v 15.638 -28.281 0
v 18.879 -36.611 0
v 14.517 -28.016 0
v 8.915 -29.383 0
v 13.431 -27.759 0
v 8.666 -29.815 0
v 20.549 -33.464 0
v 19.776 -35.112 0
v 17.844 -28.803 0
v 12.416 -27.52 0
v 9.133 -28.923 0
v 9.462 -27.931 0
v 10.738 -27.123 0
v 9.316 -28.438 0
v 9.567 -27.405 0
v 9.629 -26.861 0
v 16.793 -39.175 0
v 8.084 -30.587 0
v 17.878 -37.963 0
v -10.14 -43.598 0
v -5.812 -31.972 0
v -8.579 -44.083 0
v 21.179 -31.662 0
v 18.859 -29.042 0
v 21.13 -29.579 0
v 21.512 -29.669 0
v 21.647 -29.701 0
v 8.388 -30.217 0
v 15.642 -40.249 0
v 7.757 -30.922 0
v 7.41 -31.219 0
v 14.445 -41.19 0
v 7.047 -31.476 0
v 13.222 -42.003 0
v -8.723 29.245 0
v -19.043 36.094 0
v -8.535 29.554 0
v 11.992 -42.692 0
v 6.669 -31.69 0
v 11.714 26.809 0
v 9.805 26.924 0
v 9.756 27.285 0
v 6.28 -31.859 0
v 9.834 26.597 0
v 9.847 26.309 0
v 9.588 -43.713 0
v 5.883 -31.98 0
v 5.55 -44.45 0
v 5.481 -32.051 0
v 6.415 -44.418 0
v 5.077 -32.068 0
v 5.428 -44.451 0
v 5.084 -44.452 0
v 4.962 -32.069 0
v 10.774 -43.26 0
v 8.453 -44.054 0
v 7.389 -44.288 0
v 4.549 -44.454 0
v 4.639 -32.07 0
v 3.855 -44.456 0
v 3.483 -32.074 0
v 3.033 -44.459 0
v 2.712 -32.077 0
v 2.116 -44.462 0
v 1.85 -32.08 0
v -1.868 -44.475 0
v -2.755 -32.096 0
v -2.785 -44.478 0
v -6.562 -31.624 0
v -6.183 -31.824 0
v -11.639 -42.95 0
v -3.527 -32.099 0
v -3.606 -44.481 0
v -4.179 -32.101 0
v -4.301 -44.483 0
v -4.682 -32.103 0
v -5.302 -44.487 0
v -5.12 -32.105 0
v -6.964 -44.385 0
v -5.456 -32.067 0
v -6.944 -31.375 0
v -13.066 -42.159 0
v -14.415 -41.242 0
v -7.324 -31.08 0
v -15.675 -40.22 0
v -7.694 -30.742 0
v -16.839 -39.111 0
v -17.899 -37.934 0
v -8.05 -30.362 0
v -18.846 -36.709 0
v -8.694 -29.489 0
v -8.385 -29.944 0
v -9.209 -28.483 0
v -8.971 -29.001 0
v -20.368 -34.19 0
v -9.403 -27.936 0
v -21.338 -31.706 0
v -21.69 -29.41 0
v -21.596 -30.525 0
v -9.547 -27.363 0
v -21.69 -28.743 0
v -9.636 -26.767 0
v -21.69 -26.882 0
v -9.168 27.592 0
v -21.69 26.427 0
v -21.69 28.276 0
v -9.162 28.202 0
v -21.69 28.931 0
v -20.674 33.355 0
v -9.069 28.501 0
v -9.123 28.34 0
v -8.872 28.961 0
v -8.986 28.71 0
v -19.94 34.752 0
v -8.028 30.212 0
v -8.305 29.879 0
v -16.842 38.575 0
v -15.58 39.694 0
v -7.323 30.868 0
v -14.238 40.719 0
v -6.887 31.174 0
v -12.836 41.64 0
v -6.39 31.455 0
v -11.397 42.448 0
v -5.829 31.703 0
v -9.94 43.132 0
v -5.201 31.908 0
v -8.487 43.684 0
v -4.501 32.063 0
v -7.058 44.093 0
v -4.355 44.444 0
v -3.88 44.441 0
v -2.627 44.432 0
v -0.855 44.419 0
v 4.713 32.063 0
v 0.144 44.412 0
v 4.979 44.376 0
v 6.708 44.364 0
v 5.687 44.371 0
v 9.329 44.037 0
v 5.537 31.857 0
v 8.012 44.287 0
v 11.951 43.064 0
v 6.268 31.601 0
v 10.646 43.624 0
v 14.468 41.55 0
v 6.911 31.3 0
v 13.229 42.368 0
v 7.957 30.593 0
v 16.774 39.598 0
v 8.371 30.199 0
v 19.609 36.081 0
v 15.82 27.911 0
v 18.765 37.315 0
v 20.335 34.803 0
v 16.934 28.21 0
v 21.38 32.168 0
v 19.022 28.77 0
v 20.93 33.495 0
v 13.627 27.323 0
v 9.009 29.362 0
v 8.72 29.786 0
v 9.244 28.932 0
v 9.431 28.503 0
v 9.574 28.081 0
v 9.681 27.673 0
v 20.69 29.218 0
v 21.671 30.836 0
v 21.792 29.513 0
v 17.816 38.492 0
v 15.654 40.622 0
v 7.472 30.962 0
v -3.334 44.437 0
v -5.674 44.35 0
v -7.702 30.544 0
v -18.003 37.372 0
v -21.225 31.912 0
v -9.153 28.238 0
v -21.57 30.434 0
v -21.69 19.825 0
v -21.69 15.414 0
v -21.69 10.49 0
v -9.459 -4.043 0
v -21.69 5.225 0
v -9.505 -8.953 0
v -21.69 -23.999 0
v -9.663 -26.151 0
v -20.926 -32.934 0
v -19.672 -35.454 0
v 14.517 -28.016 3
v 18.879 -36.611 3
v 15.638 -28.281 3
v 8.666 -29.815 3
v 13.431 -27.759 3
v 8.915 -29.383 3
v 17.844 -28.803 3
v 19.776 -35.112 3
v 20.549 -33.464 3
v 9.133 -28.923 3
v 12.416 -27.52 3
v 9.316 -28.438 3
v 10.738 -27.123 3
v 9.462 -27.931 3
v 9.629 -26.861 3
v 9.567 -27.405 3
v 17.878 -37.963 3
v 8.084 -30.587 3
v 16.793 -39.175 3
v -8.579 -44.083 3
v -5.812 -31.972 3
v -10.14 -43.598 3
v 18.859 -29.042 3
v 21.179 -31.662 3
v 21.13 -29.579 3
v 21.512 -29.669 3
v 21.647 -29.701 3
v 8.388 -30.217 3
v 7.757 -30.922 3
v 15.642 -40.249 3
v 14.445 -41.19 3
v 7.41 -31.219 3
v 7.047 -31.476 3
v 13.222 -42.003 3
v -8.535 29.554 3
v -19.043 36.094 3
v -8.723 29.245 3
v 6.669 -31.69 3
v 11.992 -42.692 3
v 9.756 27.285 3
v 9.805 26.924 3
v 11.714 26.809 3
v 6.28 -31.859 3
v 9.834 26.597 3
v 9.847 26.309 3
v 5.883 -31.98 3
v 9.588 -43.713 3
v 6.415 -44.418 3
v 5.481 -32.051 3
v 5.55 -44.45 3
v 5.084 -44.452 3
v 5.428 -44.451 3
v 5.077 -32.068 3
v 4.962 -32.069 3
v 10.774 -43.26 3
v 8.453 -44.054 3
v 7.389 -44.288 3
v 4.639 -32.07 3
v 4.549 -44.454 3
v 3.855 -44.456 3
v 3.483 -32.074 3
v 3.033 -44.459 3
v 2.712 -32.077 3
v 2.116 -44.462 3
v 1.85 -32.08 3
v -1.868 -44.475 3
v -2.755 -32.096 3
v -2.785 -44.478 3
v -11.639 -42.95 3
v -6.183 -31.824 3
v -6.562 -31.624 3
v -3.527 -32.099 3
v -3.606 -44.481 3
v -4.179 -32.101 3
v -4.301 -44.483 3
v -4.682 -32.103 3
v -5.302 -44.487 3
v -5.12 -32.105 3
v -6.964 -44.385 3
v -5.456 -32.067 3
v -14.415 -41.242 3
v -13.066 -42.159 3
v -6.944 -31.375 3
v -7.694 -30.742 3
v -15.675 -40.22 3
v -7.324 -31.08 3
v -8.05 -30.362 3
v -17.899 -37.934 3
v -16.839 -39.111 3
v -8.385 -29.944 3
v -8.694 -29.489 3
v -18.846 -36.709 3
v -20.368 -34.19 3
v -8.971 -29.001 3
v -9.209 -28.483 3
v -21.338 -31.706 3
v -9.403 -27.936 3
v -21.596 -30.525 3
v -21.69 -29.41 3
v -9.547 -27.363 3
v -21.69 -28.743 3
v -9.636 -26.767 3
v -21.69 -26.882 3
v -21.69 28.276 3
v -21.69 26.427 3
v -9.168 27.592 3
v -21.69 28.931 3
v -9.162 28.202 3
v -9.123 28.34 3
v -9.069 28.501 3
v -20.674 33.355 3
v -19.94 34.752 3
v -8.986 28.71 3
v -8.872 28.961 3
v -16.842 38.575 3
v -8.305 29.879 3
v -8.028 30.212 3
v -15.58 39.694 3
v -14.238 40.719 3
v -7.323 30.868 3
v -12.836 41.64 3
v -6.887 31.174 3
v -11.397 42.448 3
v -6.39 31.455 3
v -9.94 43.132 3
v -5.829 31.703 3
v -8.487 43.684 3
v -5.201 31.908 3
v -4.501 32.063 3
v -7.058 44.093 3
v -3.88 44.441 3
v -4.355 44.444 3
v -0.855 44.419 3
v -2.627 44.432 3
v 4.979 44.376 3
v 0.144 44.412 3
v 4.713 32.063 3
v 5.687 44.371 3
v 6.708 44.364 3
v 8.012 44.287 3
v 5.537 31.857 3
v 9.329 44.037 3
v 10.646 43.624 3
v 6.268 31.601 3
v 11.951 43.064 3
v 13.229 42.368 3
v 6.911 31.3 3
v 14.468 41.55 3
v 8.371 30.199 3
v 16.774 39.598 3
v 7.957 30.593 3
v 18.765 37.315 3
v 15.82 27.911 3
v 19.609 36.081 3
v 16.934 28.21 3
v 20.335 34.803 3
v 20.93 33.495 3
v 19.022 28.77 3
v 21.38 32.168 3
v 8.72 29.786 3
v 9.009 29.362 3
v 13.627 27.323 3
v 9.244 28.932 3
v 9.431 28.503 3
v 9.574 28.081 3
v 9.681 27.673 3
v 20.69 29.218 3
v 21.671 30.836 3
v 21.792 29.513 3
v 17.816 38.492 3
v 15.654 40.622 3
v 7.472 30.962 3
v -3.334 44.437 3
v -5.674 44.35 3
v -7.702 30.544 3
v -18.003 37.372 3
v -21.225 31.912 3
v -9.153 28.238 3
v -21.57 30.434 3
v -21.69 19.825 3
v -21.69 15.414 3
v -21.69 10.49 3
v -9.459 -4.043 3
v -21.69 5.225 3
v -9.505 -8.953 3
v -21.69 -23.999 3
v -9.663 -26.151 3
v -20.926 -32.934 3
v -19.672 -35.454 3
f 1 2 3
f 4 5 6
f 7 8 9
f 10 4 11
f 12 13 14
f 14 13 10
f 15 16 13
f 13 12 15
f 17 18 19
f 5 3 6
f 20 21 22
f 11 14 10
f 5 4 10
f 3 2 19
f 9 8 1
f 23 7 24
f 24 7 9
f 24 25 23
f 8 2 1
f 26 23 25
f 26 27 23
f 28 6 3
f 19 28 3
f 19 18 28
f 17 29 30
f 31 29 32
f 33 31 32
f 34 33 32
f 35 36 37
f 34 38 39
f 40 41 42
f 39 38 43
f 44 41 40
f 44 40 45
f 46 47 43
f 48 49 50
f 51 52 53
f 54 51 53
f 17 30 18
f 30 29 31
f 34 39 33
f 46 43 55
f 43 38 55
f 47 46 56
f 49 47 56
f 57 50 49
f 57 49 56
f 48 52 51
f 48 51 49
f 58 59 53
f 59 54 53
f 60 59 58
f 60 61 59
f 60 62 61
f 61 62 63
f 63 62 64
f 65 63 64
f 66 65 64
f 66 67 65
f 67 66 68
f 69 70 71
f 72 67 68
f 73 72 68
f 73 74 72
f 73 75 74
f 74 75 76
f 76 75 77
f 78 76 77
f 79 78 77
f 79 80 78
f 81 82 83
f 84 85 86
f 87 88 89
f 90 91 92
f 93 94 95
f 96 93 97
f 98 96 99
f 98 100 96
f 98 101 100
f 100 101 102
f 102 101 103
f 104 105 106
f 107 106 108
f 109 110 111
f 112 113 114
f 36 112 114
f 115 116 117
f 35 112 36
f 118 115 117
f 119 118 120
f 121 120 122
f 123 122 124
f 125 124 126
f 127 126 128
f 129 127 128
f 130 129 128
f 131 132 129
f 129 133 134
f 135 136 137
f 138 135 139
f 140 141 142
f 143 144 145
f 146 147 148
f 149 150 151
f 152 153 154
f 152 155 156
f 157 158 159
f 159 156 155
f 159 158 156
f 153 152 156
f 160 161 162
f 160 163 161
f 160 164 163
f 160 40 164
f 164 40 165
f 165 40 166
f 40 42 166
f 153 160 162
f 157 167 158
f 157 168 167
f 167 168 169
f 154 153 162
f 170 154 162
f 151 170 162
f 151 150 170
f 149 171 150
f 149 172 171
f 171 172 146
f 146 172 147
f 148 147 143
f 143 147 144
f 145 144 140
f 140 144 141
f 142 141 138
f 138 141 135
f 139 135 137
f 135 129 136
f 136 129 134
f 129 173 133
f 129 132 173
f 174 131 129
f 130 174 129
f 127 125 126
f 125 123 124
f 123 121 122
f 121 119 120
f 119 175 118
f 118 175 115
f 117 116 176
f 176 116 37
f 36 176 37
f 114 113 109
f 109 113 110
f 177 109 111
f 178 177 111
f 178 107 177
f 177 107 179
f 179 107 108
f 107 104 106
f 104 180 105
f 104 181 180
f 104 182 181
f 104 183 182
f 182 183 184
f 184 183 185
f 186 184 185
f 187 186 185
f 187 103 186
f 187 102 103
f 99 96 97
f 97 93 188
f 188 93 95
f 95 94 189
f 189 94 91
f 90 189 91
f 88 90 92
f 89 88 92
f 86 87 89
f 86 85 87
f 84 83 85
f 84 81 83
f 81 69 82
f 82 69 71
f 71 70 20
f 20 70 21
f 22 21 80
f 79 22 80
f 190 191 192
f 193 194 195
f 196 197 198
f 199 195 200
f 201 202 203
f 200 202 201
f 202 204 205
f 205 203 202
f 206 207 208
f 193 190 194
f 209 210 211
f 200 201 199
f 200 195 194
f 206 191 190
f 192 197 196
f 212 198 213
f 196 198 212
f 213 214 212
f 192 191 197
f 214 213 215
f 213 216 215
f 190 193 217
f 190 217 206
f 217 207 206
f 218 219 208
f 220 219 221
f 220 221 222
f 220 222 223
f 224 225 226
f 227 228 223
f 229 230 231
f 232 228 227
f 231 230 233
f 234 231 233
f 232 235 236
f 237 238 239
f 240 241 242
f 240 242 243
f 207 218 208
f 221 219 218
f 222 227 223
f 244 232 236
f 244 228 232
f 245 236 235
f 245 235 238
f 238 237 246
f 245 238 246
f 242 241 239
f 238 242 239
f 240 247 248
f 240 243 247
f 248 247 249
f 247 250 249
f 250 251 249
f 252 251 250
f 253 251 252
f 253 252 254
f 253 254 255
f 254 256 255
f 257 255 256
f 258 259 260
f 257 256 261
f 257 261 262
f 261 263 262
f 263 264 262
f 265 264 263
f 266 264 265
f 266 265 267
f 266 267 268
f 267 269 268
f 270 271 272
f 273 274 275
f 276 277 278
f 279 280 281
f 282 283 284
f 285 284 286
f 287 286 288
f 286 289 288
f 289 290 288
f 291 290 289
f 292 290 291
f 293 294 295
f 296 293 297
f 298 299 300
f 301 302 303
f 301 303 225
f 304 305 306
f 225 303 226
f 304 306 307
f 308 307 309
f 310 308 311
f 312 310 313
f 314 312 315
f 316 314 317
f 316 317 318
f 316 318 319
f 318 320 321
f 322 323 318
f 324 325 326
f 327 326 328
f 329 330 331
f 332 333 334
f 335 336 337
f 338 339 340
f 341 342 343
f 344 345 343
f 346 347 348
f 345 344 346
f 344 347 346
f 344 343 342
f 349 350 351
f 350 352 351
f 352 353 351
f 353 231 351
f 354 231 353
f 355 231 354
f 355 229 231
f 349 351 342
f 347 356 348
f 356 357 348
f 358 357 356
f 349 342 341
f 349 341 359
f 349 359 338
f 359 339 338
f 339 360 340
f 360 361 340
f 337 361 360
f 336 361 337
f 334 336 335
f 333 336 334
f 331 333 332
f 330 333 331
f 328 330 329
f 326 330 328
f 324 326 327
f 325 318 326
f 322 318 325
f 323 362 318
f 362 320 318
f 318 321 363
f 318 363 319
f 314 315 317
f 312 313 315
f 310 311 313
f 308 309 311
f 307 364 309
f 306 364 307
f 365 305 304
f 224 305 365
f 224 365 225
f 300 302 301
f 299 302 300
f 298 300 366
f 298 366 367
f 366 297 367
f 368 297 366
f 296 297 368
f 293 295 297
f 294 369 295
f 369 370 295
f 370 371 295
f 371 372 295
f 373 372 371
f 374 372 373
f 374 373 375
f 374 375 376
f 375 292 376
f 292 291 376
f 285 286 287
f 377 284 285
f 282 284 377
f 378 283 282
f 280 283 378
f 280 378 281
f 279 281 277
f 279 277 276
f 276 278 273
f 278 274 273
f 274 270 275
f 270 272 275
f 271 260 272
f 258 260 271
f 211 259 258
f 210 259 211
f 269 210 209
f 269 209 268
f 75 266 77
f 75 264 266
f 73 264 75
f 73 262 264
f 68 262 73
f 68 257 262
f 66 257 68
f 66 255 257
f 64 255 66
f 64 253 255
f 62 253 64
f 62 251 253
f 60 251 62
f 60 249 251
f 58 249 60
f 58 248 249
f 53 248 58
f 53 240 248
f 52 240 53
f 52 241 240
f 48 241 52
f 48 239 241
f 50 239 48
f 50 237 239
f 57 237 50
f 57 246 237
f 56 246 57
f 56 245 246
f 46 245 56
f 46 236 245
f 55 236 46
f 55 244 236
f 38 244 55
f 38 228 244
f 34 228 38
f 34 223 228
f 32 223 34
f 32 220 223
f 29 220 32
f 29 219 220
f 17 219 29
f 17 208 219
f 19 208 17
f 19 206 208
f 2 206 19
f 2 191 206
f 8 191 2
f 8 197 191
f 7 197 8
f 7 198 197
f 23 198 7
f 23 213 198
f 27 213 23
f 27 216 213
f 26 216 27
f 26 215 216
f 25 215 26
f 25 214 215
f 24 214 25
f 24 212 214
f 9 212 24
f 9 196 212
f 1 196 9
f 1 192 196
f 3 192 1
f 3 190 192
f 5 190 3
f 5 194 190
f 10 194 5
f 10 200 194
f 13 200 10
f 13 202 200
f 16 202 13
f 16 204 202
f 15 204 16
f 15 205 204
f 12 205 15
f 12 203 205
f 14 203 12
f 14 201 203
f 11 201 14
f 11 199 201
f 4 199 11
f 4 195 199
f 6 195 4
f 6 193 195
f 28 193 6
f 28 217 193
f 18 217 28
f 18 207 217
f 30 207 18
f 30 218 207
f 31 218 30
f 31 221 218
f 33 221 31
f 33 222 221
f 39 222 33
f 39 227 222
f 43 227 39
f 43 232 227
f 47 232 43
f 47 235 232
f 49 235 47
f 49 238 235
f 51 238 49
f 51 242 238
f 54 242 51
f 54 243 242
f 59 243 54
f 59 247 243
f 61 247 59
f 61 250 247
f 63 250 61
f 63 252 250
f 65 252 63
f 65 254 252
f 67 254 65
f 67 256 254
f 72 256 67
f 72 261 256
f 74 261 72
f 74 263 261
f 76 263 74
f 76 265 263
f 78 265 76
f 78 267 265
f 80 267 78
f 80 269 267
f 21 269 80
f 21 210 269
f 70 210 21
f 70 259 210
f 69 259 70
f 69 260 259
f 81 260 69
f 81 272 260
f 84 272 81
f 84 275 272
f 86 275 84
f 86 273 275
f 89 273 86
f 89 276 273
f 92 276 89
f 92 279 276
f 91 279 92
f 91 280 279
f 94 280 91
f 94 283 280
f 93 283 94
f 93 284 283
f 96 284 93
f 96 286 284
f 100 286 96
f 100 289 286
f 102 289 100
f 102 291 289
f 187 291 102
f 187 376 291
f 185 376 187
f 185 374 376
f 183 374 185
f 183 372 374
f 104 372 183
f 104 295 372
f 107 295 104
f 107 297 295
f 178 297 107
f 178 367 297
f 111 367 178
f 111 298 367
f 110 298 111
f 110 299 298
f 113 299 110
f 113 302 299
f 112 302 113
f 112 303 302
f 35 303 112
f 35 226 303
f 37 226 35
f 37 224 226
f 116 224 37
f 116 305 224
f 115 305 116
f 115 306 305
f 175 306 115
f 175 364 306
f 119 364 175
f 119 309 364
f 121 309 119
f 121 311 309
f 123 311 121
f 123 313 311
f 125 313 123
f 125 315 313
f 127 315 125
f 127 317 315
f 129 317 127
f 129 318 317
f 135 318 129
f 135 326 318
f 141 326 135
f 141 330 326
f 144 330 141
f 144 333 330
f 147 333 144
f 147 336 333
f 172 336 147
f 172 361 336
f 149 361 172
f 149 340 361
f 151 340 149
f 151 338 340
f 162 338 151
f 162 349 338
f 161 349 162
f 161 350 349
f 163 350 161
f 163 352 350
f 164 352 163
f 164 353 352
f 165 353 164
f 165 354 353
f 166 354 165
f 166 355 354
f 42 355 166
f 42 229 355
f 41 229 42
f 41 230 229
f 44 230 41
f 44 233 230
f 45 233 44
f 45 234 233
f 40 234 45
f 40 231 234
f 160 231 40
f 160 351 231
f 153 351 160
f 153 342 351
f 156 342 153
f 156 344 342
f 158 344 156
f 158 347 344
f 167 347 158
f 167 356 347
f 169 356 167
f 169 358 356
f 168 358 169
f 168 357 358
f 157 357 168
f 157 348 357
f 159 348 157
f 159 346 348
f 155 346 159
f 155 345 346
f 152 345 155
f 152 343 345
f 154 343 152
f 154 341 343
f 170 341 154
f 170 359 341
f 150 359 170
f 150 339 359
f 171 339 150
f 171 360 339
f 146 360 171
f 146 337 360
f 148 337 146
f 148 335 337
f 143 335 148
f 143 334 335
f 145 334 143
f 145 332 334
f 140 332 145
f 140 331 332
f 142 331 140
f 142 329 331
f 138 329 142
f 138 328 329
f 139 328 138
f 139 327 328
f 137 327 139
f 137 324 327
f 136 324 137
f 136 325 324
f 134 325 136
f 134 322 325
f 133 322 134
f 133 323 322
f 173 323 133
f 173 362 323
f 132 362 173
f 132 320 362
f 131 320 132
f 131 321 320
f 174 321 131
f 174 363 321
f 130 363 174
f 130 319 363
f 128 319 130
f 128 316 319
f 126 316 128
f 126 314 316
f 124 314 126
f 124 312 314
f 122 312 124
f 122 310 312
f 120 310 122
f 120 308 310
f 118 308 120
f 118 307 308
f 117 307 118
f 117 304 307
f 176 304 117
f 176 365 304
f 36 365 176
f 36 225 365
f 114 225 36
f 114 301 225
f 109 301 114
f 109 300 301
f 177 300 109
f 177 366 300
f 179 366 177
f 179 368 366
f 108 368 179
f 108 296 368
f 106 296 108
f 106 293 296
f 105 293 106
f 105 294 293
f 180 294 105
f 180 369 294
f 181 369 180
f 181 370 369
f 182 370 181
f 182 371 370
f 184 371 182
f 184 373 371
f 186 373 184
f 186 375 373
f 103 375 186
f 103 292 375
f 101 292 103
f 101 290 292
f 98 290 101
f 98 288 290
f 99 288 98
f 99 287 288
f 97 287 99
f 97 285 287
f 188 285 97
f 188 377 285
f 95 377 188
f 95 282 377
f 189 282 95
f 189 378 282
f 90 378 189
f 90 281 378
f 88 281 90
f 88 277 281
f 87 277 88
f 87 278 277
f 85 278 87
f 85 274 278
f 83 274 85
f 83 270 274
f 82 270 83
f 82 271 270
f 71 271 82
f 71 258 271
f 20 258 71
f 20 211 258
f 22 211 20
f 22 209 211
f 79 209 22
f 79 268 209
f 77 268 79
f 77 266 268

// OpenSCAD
// Generated from 交通部公路局（原交通部公路總局）「新式號牌使用之英文字、數字字體」author trace
fudge = 0.1;

module glyph_2012_C(h = 3) {
  difference() {
    linear_extrude(height = h)
      polygon(points = [[21.7924, 29.5133], [21.6715, 30.8365], [21.3796, 32.168], [20.9298, 33.4946], [20.3354, 34.8033], [19.6095, 36.0811], [18.7652, 37.315], [17.8157, 38.4918], [16.7741, 39.5985], [15.6537, 40.6222], [14.4676, 41.5496], [13.2289, 42.3678], [11.9508, 43.0638], [10.6465, 43.6244], [9.3292, 44.0367], [8.0119, 44.2875], [6.7078, 44.3638], [6.5836, 44.3647], [6.2325, 44.3673], [5.6869, 44.3713], [4.9792, 44.3764], [4.1419, 44.3825], [3.2074, 44.3893], [2.208, 44.3966], [1.1763, 44.4041], [0.1445, 44.4116], [-0.8548, 44.4189], [-1.7894, 44.4257], [-2.6267, 44.4318], [-3.3343, 44.4369], [-3.8799, 44.4409], [-4.231, 44.4434], [-4.3553, 44.4443], [-5.6736, 44.3497], [-7.0578, 44.093], [-8.487, 43.6839], [-9.9404, 43.1322], [-11.3972, 42.4476], [-12.8365, 41.6398], [-14.2376, 40.7186], [-15.5796, 39.6938], [-16.8416, 38.575], [-18.003, 37.3719], [-19.0428, 36.0944], [-19.9402, 34.7522], [-20.6745, 33.3549], [-21.2247, 31.9124], [-21.5702, 30.4344], [-21.6899, 28.9306], [-21.6899, 28.2762], [-21.69, 26.4267], [-21.69, 23.5528], [-21.69, 19.8251], [-21.6901, 15.4141], [-21.6901, 10.4904], [-21.6902, 5.2247], [-21.6902, -0.2124], [-21.6902, -5.6504], [-21.6902, -10.9187], [-21.6902, -15.8466], [-21.6902, -20.2636], [-21.6902, -23.999], [-21.6901, -26.8823], [-21.69, -28.7428], [-21.6899, -29.41], [-21.5956, -30.5249], [-21.3383, -31.7058], [-20.9263, -32.9338], [-20.368, -34.1897], [-19.6718, -35.4544], [-18.8461, -36.7089], [-17.8991, -37.934], [-16.8393, -39.1106], [-15.675, -40.2196], [-14.4146, -41.242], [-13.0665, -42.1586], [-11.639, -42.9503], [-10.1404, -43.5981], [-8.5792, -44.0829], [-6.9636, -44.3854], [-5.3021, -44.4868], [-5.1803, -44.4864], [-4.8358, -44.4852], [-4.3006, -44.4834], [-3.6065, -44.4811], [-2.7851, -44.4783], [-1.8684, -44.4753], [-0.8881, -44.472], [0.1241, -44.4686], [1.1362, -44.4652], [2.1165, -44.4619], [3.0332, -44.4588], [3.8546, -44.4561], [4.5487, -44.4537], [5.0839, -44.452], [5.4284, -44.4508], [5.5502, -44.4504], [6.415, -44.4184], [7.3892, -44.2877], [8.4535, -44.0539], [9.5883, -43.7128], [10.7743, -43.2602], [11.9921, -42.6917], [13.2222, -42.0032], [14.4453, -41.1903], [15.642, -40.2489], [16.7927, -39.1746], [17.8782, -37.9633], [18.8789, -36.6106], [19.7756, -35.1123], [20.5487, -33.4642], [21.1789, -31.662], [21.6467, -29.7014], [21.5117, -29.6695], [21.1303, -29.5793], [20.5376, -29.4392], [19.7689, -29.2575], [18.8594, -29.0425], [17.8442, -28.8026], [16.7586, -28.546], [15.6378, -28.2811], [14.517, -28.0161], [13.4315, -27.7595], [12.4163, -27.5196], [11.5067, -27.3046], [10.738, -27.1229], [10.1454, -26.9828], [9.7639, -26.8926], [9.629, -26.8607], [9.5671, -27.4046], [9.4619, -27.9313], [9.3162, -28.4382], [9.133, -28.9228], [8.9152, -29.3826], [8.6658, -29.8149], [8.3876, -30.2173], [8.0837, -30.5871], [7.757, -30.9219], [7.4103, -31.219], [7.0467, -31.476], [6.669, -31.6902], [6.2803, -31.8591], [5.8834, -31.9801], [5.4812, -32.0508], [5.0768, -32.0684], [4.9623, -32.0688], [4.6387, -32.07], [4.1358, -32.0718], [3.4835, -32.0741], [2.7118, -32.0769], [1.8505, -32.0799], [0.9294, -32.0832], [-0.0216, -32.0866], [-0.9726, -32.09], [-1.8937, -32.0933], [-2.7551, -32.0964], [-3.5268, -32.0991], [-4.179, -32.1015], [-4.6819, -32.1033], [-5.0055, -32.1044], [-5.12, -32.1048], [-5.4557, -32.0668], [-5.8119, -31.9722], [-6.1827, -31.8237], [-6.5621, -31.6238], [-6.9445, -31.3752], [-7.3239, -31.0802], [-7.6944, -30.7416], [-8.0501, -30.3619], [-8.3854, -29.9436], [-8.6941, -29.4893], [-8.9706, -29.0015], [-9.2089, -28.4829], [-9.4031, -27.9359], [-9.5475, -27.3632], [-9.6361, -26.7672], [-9.6631, -26.1506], [-9.6575, -25.5402], [-9.6416, -23.8151], [-9.6169, -21.1346], [-9.5849, -17.658], [-9.547, -13.5443], [-9.5047, -8.953], [-9.4594, -4.0432], [-9.4127, 1.0259], [-9.366, 6.0949], [-9.3208, 11.0047], [-9.2785, 15.5961], [-9.2406, 19.7097], [-9.2086, 23.1864], [-9.1839, 25.8669], [-9.168, 27.5919], [-9.1624, 28.2023], [-9.1532, 28.2383], [-9.1232, 28.3405], [-9.0689, 28.5006], [-8.9865, 28.7104], [-8.8725, 28.9615], [-8.7234, 29.2455], [-8.5354, 29.5541], [-8.3049, 29.8789], [-8.0285, 30.2117], [-7.7023, 30.5441], [-7.323, 30.8677], [-6.8867, 31.1742], [-6.39, 31.4553], [-5.8292, 31.7026], [-5.2007, 31.9078], [-4.501, 32.0626], [-4.3975, 32.0626], [-4.1051, 32.0626], [-3.6507, 32.0626], [-3.0613, 32.0626], [-2.364, 32.0626], [-1.5857, 32.0626], [-0.7534, 32.0626], [0.1058, 32.0626], [0.9651, 32.0626], [1.7974, 32.0626], [2.5757, 32.0626], [3.273, 32.0626], [3.8624, 32.0626], [4.3167, 32.0626], [4.6092, 32.0626], [4.7126, 32.0626], [5.5369, 31.857], [6.2679, 31.6008], [6.9112, 31.3004], [7.4725, 30.9624], [7.9573, 30.593], [8.3712, 30.1988], [8.7199, 29.7862], [9.009, 29.3617], [9.244, 28.9317], [9.4306, 28.5026], [9.5744, 28.0809], [9.681, 27.673], [9.756, 27.2854], [9.805, 26.9245], [9.8336, 26.5968], [9.8475, 26.3086], [9.9816, 26.3446], [10.3607, 26.4463], [10.9498, 26.6044], [11.7139, 26.8094], [12.6179, 27.0519], [13.6269, 27.3226], [14.7059, 27.6121], [15.8199, 27.911], [16.9339, 28.2098], [18.0129, 28.4993], [19.0219, 28.77], [19.926, 29.0126], [20.69, 29.2176], [21.2791, 29.3756], [21.6582, 29.4773]]);
  }
}

glyph_2012_C();
